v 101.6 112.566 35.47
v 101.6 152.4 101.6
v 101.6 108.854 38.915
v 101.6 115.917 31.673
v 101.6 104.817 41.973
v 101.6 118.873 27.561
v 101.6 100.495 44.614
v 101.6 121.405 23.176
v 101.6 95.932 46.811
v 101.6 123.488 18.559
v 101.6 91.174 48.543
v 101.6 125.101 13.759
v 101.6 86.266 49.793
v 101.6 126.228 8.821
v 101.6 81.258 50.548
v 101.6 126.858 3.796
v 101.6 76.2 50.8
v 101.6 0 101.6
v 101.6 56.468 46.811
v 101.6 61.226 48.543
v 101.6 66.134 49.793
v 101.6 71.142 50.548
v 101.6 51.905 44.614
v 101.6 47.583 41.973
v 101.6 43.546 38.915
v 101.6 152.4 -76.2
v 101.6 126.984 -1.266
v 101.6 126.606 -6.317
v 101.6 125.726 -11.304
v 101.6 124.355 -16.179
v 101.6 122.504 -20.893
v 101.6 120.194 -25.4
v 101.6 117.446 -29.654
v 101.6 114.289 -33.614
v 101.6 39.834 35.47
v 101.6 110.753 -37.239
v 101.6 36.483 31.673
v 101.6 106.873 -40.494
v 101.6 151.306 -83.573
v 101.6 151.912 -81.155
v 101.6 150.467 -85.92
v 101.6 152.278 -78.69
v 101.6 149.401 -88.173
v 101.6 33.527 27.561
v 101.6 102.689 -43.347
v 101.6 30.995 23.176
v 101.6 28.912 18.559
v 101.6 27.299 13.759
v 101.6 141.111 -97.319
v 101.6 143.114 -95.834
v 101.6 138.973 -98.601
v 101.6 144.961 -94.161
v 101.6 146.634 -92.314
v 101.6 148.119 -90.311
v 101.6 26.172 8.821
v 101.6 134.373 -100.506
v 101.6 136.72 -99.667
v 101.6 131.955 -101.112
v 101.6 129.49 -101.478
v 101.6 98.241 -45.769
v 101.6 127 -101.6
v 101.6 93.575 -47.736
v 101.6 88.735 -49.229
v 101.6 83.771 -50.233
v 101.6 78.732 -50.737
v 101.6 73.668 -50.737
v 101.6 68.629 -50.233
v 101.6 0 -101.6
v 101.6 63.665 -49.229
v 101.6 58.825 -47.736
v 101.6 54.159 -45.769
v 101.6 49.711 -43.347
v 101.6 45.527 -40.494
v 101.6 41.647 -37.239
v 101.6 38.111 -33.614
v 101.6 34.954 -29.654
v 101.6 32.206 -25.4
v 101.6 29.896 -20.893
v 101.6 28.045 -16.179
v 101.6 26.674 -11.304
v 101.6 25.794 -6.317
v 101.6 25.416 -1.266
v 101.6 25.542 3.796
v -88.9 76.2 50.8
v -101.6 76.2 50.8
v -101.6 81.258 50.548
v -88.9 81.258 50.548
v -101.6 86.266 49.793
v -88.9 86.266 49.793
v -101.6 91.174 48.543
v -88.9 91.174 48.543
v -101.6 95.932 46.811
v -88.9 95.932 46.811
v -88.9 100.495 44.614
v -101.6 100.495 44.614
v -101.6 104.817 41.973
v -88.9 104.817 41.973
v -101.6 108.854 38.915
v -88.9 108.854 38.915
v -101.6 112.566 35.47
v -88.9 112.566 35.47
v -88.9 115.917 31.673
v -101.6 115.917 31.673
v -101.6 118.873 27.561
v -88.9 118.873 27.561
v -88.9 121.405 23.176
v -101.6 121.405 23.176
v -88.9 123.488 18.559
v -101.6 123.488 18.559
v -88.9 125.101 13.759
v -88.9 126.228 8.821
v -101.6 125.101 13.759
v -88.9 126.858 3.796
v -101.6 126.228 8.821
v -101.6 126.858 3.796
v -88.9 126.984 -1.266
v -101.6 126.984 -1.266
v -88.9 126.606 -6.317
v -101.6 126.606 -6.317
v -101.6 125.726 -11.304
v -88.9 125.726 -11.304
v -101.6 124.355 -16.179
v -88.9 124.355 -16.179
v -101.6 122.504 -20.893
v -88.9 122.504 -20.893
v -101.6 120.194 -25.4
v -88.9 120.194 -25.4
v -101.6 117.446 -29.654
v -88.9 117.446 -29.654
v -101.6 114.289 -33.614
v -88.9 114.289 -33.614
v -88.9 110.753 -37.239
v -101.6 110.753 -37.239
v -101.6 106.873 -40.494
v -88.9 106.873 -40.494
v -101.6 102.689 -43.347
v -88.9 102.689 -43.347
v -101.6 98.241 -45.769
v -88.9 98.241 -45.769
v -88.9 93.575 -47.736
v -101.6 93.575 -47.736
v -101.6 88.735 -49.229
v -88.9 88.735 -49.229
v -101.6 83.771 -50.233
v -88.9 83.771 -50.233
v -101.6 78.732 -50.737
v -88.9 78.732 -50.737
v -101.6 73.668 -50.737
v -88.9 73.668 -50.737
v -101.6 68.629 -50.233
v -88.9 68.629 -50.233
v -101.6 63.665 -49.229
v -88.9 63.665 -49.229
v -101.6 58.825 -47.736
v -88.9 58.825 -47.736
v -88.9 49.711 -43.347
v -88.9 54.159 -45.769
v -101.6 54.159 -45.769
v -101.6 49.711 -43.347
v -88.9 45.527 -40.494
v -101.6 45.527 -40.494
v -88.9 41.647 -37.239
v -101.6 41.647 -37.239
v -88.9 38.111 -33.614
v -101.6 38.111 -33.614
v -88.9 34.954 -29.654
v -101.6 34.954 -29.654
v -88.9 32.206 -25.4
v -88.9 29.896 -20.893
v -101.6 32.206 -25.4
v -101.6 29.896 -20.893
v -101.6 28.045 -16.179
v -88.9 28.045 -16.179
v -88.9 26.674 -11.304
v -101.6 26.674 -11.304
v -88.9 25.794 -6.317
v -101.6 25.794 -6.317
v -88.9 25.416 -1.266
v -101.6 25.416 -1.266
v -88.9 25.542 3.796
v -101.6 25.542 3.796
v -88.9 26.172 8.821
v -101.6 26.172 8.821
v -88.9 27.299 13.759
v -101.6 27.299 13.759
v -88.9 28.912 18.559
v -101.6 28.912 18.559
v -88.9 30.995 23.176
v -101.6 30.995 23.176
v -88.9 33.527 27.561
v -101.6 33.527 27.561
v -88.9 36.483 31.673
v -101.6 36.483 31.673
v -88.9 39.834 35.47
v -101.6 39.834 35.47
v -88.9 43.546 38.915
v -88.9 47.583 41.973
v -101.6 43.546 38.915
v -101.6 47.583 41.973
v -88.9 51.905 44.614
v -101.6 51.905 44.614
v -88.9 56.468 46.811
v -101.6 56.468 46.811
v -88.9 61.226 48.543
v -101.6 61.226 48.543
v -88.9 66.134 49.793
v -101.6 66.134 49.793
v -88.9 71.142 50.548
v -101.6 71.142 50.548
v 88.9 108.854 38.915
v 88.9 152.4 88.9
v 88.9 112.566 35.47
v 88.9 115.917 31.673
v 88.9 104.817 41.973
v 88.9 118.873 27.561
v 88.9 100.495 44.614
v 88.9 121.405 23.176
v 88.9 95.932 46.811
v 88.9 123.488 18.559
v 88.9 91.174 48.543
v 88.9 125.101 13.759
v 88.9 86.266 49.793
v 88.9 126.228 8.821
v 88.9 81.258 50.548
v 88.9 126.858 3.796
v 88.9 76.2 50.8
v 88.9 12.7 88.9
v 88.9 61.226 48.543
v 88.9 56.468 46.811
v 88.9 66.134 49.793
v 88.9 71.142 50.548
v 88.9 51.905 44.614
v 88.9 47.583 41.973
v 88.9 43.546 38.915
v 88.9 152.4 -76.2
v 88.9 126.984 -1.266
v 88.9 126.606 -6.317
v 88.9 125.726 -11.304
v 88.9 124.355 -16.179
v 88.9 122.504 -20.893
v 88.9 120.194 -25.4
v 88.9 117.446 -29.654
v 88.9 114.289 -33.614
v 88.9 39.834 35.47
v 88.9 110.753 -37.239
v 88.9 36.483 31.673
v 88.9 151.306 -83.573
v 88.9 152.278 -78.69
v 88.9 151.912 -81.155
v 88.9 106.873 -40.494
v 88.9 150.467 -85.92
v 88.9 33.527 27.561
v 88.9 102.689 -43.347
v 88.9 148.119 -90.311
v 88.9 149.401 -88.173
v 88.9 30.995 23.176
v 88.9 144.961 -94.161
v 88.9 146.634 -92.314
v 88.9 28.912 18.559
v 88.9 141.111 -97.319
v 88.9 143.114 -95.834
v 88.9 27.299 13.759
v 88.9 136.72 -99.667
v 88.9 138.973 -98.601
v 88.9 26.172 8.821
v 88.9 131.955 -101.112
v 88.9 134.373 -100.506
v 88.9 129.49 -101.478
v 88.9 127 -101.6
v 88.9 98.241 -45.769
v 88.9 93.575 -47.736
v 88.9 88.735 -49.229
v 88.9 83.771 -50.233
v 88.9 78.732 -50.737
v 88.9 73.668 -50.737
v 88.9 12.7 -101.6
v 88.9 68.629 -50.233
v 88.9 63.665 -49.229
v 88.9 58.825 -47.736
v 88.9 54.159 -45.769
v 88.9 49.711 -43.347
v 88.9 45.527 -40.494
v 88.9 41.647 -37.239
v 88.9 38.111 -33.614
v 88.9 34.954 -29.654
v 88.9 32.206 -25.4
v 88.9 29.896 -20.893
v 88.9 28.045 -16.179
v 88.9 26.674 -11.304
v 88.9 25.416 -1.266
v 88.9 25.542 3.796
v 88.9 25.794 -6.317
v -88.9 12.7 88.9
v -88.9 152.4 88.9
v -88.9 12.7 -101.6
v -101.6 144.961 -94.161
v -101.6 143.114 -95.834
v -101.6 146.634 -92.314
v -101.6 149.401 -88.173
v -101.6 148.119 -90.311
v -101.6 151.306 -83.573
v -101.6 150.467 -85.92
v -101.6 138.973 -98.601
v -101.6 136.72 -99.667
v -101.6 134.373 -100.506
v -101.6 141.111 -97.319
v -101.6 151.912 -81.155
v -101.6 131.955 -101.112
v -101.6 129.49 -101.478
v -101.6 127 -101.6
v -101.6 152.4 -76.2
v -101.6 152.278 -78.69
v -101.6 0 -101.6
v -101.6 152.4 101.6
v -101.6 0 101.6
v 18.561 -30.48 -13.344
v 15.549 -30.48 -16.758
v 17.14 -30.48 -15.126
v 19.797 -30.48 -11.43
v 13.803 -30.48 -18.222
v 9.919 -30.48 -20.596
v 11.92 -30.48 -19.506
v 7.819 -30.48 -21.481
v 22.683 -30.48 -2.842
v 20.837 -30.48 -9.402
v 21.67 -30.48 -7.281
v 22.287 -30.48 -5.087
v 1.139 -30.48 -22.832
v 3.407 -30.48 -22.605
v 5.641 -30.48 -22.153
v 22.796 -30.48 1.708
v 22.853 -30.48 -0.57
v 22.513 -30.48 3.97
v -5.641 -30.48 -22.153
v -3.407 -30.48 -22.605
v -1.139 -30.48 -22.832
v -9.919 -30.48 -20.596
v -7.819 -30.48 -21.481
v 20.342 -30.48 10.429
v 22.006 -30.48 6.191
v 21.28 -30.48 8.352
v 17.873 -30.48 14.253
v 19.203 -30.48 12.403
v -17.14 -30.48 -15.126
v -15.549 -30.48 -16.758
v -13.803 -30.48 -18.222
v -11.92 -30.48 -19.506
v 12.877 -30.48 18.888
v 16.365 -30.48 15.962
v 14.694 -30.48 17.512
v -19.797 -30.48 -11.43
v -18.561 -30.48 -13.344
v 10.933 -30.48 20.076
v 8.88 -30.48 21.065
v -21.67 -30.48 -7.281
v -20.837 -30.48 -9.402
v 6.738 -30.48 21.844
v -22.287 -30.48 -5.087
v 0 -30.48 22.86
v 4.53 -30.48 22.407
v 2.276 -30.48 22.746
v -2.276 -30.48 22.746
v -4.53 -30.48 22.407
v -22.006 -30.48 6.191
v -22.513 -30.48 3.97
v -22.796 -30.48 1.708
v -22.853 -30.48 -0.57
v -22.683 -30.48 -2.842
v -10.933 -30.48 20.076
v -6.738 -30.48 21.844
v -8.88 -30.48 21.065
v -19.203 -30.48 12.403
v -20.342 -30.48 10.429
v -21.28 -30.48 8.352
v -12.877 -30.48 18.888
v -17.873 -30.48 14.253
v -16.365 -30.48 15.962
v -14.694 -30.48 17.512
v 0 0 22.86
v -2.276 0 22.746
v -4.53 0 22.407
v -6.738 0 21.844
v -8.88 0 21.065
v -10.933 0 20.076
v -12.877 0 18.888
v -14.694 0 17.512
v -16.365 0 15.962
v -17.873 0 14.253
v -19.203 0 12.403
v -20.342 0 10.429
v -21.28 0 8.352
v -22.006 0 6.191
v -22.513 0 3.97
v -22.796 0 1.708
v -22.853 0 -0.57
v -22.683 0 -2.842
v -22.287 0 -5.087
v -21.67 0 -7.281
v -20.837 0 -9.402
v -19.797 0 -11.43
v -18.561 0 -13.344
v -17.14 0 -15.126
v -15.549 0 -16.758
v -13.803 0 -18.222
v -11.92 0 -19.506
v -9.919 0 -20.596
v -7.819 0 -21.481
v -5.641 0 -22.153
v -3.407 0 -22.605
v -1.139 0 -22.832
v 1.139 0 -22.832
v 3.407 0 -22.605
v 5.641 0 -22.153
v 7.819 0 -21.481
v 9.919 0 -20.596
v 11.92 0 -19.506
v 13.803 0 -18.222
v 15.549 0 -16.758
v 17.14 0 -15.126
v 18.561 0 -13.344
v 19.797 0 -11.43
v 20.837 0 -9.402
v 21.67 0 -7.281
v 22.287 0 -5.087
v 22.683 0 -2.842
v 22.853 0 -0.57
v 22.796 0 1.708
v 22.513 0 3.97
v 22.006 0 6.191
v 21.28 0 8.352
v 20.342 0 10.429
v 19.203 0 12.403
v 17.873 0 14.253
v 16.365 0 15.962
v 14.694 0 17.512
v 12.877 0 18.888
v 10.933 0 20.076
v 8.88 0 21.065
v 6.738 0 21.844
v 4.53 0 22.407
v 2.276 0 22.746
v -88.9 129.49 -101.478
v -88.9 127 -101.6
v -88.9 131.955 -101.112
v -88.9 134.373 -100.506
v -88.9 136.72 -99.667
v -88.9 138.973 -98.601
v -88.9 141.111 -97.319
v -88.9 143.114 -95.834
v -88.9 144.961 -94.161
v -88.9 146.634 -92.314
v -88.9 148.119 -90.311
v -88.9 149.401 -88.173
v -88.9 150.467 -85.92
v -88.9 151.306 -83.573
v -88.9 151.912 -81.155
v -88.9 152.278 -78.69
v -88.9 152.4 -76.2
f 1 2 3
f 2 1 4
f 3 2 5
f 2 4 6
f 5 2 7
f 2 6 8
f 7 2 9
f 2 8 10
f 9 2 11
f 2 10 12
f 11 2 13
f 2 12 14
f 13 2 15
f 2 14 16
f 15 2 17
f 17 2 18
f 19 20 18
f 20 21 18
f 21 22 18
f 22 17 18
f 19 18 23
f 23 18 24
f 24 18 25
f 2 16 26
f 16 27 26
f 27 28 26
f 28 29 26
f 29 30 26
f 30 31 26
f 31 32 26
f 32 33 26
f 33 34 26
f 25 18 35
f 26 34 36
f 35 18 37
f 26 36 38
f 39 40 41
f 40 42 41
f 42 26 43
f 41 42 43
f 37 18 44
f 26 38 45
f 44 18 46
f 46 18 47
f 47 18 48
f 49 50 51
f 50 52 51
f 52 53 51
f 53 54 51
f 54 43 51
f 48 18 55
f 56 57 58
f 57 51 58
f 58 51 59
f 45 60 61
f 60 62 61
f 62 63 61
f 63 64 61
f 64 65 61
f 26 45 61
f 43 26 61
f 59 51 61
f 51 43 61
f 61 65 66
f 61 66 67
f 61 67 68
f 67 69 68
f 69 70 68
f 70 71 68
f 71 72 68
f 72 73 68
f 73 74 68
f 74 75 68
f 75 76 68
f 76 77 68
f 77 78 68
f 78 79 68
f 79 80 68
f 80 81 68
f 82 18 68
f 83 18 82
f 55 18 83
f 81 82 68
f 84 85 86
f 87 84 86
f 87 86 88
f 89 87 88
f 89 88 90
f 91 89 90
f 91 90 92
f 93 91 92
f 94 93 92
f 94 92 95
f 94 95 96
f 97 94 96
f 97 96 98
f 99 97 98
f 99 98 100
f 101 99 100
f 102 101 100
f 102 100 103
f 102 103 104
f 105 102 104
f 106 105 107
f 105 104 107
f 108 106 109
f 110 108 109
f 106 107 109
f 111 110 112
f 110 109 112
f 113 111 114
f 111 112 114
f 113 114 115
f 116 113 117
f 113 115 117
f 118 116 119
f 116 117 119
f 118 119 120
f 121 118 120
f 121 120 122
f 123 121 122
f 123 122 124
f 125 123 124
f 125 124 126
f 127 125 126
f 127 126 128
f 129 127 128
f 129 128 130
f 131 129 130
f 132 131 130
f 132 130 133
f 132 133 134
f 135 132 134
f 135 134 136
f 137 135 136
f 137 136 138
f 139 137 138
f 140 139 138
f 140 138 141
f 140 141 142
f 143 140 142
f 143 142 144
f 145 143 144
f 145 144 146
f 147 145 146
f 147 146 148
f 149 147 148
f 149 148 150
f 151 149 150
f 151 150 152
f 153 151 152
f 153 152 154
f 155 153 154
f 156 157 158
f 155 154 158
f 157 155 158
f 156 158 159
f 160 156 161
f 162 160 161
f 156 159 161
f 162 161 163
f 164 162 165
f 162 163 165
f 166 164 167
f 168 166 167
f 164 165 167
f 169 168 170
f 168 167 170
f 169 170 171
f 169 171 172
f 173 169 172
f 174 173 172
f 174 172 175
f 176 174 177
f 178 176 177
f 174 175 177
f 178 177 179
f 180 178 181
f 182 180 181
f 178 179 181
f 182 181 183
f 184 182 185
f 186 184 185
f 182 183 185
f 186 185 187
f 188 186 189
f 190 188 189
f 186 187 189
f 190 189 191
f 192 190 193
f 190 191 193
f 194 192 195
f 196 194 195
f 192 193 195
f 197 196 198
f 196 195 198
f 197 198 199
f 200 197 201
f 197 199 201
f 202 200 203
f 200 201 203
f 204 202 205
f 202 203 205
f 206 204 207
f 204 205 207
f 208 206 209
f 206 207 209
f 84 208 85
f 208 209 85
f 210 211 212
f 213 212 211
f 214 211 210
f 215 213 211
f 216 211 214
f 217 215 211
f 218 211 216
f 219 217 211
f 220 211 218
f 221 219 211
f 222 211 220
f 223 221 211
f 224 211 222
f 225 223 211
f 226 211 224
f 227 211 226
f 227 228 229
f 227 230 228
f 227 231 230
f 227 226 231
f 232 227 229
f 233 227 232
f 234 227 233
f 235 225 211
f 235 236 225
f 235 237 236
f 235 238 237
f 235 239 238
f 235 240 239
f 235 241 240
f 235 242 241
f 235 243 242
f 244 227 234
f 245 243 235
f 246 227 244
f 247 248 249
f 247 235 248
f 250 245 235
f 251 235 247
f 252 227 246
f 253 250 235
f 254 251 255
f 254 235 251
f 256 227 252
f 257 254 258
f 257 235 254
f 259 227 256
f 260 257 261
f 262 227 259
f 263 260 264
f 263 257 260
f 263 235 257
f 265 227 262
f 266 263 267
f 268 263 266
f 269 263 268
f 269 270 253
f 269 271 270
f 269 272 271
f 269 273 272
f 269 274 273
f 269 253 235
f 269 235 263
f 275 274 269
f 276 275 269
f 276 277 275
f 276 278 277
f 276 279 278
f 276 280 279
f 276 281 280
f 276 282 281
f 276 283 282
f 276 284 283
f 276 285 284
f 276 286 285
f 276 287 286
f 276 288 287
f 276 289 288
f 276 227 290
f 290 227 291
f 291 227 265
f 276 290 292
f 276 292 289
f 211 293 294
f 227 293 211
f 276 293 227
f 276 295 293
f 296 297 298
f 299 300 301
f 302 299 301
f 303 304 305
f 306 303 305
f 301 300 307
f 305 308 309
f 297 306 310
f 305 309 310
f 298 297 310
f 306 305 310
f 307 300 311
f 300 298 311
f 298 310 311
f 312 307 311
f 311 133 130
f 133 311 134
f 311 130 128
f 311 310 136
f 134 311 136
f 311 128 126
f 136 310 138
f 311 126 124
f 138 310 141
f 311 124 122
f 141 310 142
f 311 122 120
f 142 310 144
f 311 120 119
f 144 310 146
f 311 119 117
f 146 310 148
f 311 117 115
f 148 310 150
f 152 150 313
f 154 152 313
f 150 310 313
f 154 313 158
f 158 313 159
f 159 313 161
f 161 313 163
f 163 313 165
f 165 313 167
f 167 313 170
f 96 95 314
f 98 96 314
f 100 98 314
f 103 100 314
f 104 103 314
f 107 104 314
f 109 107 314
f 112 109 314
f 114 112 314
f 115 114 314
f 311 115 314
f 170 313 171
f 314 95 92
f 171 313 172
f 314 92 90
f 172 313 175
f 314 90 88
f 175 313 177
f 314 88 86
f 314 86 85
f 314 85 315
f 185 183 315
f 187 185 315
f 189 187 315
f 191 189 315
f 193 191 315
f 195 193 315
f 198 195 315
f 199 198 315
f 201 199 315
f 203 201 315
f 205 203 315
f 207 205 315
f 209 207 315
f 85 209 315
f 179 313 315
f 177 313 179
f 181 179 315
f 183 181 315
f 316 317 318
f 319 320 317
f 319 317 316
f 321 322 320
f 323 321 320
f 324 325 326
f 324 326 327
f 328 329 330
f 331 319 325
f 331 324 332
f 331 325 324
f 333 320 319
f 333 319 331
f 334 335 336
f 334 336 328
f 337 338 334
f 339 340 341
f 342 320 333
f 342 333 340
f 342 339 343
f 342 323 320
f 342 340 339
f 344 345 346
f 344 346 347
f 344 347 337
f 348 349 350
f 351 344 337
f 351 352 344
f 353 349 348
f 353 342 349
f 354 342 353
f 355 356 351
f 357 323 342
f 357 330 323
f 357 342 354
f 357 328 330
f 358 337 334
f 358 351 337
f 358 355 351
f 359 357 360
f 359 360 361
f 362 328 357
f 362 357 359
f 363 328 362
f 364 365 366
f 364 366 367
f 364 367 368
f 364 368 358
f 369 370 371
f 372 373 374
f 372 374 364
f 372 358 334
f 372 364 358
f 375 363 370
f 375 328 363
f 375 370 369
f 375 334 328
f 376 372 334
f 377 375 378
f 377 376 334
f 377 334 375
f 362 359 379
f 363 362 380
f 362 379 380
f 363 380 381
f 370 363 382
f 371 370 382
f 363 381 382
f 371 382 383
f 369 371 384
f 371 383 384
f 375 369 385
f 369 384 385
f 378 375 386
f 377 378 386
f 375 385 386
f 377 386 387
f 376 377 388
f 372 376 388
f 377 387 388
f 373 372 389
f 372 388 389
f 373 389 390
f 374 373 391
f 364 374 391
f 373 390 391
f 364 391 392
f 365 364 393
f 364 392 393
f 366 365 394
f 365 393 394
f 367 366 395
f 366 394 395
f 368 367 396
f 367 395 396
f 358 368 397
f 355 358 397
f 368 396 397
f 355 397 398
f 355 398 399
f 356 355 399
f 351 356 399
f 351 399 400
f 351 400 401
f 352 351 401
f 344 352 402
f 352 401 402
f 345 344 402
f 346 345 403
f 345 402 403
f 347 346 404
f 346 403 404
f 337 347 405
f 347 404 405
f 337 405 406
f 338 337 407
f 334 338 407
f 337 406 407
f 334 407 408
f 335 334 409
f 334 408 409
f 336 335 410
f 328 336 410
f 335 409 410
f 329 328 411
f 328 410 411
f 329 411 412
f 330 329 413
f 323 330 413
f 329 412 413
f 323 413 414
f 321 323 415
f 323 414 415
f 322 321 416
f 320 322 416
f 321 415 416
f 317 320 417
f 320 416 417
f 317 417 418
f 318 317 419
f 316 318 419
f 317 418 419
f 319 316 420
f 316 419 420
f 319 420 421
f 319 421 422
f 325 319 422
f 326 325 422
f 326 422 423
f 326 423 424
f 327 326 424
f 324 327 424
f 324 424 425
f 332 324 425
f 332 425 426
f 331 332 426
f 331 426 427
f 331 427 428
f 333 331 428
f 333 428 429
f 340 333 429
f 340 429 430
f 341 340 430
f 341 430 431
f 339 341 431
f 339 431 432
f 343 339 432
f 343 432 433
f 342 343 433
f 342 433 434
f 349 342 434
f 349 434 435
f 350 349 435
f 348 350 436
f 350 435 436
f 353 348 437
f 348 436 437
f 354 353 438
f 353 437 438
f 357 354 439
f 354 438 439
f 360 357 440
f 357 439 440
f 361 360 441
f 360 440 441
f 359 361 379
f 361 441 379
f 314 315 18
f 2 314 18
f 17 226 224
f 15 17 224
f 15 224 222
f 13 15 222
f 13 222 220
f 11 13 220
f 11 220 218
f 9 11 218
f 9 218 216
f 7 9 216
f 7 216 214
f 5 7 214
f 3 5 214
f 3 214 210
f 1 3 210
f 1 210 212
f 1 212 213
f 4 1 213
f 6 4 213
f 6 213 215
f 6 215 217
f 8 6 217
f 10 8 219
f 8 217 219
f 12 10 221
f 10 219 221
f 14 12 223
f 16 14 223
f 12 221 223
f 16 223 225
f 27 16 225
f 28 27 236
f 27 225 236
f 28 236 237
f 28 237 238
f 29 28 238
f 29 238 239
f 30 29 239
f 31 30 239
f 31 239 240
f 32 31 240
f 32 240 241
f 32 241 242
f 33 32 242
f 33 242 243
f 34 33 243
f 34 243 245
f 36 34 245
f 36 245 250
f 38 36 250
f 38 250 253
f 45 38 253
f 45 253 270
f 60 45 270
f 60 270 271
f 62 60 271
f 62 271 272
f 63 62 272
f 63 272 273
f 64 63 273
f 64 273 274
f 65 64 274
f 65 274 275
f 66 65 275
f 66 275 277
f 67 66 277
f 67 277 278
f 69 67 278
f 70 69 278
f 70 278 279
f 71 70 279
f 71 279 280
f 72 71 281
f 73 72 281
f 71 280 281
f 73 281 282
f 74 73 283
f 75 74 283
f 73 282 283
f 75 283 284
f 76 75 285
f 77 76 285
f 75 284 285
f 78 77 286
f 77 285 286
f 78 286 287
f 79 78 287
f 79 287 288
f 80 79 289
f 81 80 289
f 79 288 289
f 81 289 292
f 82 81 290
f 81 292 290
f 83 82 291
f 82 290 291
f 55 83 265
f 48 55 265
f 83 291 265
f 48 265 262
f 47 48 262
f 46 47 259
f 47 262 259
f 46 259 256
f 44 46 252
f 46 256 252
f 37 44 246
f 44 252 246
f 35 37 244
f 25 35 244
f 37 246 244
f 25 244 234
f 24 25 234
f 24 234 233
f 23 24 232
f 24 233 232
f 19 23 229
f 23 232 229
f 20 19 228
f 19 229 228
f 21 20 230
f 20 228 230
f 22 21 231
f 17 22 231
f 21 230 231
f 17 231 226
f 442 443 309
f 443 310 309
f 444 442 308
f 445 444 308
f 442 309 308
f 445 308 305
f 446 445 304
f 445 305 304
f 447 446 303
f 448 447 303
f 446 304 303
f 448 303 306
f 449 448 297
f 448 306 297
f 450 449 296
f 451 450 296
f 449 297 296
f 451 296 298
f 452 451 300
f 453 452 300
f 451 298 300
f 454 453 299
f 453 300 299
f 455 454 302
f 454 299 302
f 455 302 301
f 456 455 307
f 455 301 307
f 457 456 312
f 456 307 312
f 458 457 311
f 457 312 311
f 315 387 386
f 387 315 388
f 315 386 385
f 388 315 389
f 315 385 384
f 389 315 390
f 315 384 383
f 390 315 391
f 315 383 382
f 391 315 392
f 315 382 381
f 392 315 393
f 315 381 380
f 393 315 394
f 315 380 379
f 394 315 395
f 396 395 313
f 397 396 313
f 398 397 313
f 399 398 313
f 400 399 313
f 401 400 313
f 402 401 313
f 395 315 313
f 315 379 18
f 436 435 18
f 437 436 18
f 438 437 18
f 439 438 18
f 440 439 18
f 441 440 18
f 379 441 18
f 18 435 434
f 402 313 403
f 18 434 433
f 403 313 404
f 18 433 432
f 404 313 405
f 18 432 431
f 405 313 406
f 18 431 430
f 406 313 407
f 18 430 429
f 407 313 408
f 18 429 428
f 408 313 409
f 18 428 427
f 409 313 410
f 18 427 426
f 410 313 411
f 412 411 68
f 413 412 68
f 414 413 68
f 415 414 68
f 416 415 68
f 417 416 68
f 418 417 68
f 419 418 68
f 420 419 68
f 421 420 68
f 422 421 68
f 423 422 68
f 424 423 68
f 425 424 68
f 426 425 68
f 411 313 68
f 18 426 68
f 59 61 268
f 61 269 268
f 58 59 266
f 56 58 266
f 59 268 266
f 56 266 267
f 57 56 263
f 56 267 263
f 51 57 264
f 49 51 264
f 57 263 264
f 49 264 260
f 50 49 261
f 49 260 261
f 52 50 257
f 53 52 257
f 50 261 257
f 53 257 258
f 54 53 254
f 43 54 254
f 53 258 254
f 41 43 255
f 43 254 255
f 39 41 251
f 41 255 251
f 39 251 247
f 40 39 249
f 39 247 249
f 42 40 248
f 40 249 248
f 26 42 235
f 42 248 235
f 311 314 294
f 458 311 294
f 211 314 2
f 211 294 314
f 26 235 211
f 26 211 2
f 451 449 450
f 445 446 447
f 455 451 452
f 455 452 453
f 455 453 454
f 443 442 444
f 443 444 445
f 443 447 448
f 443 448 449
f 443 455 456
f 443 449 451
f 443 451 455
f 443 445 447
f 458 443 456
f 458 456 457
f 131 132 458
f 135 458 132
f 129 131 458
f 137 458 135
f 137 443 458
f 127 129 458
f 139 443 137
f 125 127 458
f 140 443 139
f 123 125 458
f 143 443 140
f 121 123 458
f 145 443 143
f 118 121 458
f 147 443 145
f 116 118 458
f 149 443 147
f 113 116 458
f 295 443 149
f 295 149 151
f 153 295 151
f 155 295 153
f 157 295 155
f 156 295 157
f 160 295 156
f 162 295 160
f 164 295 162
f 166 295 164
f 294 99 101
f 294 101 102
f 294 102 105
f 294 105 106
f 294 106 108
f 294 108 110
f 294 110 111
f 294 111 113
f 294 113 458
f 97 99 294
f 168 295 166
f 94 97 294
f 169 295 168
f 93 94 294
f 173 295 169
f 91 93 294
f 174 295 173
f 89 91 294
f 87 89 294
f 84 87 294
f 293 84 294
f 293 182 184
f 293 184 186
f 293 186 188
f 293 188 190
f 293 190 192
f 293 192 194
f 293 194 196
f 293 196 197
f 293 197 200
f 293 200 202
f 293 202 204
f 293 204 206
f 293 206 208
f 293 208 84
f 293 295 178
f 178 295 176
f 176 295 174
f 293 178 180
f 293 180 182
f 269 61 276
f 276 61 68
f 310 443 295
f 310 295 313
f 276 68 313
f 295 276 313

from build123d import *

# Parameters (mm, degrees)
SKETCH1_R           = 101.6
BOSS_EXTRUDE1_DEPTH = 152.4
SHELL1_T            = -12.7
SKETCH2_R           = 22.86
BOSS_EXTRUDE2_DEPTH = 30.48
SKETCH3_R           = 50.8
CUT_EXTRUDE1_DEPTH  = 274.566372202
FILLET1_R           = 25.4
FILLET2_R           = 25.4


with BuildPart() as part:
    # Sketch1 → Boss-Extrude1 (new body)
    with BuildSketch(Plane(origin=(0, 0, 0), x_dir=(1, 0, 0), z_dir=(0, 1, 0))):
        with BuildLine():
            ThreePointArc((101.6, 0), (71.842048938, -71.842048999), (-8.6e-08, -101.6))
            Line((-8.6e-08, -101.6), (101.6, -101.6))
            Line((101.6, -101.6), (101.6, 0))
        make_face()
        with BuildLine():
            ThreePointArc((-7e-08, 101.6), (71.842048944, 71.842048993), (101.6, 0))
            Line((101.6, 0), (101.6, 101.6))
            Line((101.6, 101.6), (-7e-08, 101.6))
        make_face()
        with BuildLine():
            Line((-101.6, 101.6), (-101.6, 8e-08))
            ThreePointArc((-101.6, 8e-08), (-71.842048965, 71.842048972), (-7e-08, 101.6))
            Line((-7e-08, 101.6), (-101.6, 101.6))
        make_face()
        with BuildLine():
            Line((-101.6, 8e-08), (-101.6, -101.6))
            Line((-101.6, -101.6), (-8.6e-08, -101.6))
            ThreePointArc((-8.6e-08, -101.6), (-71.842049028, -71.84204891), (-101.6, 8e-08))
        make_face()
        Circle(SKETCH1_R)
    extrude(amount=BOSS_EXTRUDE1_DEPTH)

    # Shell1
    shell1_openings = [part.faces().sort_by_distance(p)[0] for p in [
        (0, 152.4, 0),
        (0, 76.2, -101.6),
    ]]
    offset(amount=SHELL1_T, openings=shell1_openings, kind=Kind.INTERSECTION)

    # Sketch2 → Boss-Extrude2 (add)
    with BuildSketch(Plane.XZ):
        with Locations(Location((0, 0, 0), (0, 0, 90))):
            Circle(SKETCH2_R)
    extrude(amount=BOSS_EXTRUDE2_DEPTH)

    # Sketch3 → Cut-Extrude1 (cut, through all)
    with BuildSketch(Plane.ZY.offset(101.6)):
        with Locations((0, 76.2)):
            Circle(SKETCH3_R)
    extrude(amount=-CUT_EXTRUDE1_DEPTH, mode=Mode.SUBTRACT)

    # Fillet1
    fillet1_edges = [part.edges().sort_by_distance(p)[0] for p in [
        (-95.25, 152.4, -101.6),
    ]]
    fillet(fillet1_edges, radius=FILLET1_R)

    # Fillet2
    fillet2_edges = [part.edges().sort_by_distance(p)[0] for p in [
        (95.25, 152.4, -101.6),
    ]]
    fillet(fillet2_edges, radius=FILLET2_R)


solid = part.part
